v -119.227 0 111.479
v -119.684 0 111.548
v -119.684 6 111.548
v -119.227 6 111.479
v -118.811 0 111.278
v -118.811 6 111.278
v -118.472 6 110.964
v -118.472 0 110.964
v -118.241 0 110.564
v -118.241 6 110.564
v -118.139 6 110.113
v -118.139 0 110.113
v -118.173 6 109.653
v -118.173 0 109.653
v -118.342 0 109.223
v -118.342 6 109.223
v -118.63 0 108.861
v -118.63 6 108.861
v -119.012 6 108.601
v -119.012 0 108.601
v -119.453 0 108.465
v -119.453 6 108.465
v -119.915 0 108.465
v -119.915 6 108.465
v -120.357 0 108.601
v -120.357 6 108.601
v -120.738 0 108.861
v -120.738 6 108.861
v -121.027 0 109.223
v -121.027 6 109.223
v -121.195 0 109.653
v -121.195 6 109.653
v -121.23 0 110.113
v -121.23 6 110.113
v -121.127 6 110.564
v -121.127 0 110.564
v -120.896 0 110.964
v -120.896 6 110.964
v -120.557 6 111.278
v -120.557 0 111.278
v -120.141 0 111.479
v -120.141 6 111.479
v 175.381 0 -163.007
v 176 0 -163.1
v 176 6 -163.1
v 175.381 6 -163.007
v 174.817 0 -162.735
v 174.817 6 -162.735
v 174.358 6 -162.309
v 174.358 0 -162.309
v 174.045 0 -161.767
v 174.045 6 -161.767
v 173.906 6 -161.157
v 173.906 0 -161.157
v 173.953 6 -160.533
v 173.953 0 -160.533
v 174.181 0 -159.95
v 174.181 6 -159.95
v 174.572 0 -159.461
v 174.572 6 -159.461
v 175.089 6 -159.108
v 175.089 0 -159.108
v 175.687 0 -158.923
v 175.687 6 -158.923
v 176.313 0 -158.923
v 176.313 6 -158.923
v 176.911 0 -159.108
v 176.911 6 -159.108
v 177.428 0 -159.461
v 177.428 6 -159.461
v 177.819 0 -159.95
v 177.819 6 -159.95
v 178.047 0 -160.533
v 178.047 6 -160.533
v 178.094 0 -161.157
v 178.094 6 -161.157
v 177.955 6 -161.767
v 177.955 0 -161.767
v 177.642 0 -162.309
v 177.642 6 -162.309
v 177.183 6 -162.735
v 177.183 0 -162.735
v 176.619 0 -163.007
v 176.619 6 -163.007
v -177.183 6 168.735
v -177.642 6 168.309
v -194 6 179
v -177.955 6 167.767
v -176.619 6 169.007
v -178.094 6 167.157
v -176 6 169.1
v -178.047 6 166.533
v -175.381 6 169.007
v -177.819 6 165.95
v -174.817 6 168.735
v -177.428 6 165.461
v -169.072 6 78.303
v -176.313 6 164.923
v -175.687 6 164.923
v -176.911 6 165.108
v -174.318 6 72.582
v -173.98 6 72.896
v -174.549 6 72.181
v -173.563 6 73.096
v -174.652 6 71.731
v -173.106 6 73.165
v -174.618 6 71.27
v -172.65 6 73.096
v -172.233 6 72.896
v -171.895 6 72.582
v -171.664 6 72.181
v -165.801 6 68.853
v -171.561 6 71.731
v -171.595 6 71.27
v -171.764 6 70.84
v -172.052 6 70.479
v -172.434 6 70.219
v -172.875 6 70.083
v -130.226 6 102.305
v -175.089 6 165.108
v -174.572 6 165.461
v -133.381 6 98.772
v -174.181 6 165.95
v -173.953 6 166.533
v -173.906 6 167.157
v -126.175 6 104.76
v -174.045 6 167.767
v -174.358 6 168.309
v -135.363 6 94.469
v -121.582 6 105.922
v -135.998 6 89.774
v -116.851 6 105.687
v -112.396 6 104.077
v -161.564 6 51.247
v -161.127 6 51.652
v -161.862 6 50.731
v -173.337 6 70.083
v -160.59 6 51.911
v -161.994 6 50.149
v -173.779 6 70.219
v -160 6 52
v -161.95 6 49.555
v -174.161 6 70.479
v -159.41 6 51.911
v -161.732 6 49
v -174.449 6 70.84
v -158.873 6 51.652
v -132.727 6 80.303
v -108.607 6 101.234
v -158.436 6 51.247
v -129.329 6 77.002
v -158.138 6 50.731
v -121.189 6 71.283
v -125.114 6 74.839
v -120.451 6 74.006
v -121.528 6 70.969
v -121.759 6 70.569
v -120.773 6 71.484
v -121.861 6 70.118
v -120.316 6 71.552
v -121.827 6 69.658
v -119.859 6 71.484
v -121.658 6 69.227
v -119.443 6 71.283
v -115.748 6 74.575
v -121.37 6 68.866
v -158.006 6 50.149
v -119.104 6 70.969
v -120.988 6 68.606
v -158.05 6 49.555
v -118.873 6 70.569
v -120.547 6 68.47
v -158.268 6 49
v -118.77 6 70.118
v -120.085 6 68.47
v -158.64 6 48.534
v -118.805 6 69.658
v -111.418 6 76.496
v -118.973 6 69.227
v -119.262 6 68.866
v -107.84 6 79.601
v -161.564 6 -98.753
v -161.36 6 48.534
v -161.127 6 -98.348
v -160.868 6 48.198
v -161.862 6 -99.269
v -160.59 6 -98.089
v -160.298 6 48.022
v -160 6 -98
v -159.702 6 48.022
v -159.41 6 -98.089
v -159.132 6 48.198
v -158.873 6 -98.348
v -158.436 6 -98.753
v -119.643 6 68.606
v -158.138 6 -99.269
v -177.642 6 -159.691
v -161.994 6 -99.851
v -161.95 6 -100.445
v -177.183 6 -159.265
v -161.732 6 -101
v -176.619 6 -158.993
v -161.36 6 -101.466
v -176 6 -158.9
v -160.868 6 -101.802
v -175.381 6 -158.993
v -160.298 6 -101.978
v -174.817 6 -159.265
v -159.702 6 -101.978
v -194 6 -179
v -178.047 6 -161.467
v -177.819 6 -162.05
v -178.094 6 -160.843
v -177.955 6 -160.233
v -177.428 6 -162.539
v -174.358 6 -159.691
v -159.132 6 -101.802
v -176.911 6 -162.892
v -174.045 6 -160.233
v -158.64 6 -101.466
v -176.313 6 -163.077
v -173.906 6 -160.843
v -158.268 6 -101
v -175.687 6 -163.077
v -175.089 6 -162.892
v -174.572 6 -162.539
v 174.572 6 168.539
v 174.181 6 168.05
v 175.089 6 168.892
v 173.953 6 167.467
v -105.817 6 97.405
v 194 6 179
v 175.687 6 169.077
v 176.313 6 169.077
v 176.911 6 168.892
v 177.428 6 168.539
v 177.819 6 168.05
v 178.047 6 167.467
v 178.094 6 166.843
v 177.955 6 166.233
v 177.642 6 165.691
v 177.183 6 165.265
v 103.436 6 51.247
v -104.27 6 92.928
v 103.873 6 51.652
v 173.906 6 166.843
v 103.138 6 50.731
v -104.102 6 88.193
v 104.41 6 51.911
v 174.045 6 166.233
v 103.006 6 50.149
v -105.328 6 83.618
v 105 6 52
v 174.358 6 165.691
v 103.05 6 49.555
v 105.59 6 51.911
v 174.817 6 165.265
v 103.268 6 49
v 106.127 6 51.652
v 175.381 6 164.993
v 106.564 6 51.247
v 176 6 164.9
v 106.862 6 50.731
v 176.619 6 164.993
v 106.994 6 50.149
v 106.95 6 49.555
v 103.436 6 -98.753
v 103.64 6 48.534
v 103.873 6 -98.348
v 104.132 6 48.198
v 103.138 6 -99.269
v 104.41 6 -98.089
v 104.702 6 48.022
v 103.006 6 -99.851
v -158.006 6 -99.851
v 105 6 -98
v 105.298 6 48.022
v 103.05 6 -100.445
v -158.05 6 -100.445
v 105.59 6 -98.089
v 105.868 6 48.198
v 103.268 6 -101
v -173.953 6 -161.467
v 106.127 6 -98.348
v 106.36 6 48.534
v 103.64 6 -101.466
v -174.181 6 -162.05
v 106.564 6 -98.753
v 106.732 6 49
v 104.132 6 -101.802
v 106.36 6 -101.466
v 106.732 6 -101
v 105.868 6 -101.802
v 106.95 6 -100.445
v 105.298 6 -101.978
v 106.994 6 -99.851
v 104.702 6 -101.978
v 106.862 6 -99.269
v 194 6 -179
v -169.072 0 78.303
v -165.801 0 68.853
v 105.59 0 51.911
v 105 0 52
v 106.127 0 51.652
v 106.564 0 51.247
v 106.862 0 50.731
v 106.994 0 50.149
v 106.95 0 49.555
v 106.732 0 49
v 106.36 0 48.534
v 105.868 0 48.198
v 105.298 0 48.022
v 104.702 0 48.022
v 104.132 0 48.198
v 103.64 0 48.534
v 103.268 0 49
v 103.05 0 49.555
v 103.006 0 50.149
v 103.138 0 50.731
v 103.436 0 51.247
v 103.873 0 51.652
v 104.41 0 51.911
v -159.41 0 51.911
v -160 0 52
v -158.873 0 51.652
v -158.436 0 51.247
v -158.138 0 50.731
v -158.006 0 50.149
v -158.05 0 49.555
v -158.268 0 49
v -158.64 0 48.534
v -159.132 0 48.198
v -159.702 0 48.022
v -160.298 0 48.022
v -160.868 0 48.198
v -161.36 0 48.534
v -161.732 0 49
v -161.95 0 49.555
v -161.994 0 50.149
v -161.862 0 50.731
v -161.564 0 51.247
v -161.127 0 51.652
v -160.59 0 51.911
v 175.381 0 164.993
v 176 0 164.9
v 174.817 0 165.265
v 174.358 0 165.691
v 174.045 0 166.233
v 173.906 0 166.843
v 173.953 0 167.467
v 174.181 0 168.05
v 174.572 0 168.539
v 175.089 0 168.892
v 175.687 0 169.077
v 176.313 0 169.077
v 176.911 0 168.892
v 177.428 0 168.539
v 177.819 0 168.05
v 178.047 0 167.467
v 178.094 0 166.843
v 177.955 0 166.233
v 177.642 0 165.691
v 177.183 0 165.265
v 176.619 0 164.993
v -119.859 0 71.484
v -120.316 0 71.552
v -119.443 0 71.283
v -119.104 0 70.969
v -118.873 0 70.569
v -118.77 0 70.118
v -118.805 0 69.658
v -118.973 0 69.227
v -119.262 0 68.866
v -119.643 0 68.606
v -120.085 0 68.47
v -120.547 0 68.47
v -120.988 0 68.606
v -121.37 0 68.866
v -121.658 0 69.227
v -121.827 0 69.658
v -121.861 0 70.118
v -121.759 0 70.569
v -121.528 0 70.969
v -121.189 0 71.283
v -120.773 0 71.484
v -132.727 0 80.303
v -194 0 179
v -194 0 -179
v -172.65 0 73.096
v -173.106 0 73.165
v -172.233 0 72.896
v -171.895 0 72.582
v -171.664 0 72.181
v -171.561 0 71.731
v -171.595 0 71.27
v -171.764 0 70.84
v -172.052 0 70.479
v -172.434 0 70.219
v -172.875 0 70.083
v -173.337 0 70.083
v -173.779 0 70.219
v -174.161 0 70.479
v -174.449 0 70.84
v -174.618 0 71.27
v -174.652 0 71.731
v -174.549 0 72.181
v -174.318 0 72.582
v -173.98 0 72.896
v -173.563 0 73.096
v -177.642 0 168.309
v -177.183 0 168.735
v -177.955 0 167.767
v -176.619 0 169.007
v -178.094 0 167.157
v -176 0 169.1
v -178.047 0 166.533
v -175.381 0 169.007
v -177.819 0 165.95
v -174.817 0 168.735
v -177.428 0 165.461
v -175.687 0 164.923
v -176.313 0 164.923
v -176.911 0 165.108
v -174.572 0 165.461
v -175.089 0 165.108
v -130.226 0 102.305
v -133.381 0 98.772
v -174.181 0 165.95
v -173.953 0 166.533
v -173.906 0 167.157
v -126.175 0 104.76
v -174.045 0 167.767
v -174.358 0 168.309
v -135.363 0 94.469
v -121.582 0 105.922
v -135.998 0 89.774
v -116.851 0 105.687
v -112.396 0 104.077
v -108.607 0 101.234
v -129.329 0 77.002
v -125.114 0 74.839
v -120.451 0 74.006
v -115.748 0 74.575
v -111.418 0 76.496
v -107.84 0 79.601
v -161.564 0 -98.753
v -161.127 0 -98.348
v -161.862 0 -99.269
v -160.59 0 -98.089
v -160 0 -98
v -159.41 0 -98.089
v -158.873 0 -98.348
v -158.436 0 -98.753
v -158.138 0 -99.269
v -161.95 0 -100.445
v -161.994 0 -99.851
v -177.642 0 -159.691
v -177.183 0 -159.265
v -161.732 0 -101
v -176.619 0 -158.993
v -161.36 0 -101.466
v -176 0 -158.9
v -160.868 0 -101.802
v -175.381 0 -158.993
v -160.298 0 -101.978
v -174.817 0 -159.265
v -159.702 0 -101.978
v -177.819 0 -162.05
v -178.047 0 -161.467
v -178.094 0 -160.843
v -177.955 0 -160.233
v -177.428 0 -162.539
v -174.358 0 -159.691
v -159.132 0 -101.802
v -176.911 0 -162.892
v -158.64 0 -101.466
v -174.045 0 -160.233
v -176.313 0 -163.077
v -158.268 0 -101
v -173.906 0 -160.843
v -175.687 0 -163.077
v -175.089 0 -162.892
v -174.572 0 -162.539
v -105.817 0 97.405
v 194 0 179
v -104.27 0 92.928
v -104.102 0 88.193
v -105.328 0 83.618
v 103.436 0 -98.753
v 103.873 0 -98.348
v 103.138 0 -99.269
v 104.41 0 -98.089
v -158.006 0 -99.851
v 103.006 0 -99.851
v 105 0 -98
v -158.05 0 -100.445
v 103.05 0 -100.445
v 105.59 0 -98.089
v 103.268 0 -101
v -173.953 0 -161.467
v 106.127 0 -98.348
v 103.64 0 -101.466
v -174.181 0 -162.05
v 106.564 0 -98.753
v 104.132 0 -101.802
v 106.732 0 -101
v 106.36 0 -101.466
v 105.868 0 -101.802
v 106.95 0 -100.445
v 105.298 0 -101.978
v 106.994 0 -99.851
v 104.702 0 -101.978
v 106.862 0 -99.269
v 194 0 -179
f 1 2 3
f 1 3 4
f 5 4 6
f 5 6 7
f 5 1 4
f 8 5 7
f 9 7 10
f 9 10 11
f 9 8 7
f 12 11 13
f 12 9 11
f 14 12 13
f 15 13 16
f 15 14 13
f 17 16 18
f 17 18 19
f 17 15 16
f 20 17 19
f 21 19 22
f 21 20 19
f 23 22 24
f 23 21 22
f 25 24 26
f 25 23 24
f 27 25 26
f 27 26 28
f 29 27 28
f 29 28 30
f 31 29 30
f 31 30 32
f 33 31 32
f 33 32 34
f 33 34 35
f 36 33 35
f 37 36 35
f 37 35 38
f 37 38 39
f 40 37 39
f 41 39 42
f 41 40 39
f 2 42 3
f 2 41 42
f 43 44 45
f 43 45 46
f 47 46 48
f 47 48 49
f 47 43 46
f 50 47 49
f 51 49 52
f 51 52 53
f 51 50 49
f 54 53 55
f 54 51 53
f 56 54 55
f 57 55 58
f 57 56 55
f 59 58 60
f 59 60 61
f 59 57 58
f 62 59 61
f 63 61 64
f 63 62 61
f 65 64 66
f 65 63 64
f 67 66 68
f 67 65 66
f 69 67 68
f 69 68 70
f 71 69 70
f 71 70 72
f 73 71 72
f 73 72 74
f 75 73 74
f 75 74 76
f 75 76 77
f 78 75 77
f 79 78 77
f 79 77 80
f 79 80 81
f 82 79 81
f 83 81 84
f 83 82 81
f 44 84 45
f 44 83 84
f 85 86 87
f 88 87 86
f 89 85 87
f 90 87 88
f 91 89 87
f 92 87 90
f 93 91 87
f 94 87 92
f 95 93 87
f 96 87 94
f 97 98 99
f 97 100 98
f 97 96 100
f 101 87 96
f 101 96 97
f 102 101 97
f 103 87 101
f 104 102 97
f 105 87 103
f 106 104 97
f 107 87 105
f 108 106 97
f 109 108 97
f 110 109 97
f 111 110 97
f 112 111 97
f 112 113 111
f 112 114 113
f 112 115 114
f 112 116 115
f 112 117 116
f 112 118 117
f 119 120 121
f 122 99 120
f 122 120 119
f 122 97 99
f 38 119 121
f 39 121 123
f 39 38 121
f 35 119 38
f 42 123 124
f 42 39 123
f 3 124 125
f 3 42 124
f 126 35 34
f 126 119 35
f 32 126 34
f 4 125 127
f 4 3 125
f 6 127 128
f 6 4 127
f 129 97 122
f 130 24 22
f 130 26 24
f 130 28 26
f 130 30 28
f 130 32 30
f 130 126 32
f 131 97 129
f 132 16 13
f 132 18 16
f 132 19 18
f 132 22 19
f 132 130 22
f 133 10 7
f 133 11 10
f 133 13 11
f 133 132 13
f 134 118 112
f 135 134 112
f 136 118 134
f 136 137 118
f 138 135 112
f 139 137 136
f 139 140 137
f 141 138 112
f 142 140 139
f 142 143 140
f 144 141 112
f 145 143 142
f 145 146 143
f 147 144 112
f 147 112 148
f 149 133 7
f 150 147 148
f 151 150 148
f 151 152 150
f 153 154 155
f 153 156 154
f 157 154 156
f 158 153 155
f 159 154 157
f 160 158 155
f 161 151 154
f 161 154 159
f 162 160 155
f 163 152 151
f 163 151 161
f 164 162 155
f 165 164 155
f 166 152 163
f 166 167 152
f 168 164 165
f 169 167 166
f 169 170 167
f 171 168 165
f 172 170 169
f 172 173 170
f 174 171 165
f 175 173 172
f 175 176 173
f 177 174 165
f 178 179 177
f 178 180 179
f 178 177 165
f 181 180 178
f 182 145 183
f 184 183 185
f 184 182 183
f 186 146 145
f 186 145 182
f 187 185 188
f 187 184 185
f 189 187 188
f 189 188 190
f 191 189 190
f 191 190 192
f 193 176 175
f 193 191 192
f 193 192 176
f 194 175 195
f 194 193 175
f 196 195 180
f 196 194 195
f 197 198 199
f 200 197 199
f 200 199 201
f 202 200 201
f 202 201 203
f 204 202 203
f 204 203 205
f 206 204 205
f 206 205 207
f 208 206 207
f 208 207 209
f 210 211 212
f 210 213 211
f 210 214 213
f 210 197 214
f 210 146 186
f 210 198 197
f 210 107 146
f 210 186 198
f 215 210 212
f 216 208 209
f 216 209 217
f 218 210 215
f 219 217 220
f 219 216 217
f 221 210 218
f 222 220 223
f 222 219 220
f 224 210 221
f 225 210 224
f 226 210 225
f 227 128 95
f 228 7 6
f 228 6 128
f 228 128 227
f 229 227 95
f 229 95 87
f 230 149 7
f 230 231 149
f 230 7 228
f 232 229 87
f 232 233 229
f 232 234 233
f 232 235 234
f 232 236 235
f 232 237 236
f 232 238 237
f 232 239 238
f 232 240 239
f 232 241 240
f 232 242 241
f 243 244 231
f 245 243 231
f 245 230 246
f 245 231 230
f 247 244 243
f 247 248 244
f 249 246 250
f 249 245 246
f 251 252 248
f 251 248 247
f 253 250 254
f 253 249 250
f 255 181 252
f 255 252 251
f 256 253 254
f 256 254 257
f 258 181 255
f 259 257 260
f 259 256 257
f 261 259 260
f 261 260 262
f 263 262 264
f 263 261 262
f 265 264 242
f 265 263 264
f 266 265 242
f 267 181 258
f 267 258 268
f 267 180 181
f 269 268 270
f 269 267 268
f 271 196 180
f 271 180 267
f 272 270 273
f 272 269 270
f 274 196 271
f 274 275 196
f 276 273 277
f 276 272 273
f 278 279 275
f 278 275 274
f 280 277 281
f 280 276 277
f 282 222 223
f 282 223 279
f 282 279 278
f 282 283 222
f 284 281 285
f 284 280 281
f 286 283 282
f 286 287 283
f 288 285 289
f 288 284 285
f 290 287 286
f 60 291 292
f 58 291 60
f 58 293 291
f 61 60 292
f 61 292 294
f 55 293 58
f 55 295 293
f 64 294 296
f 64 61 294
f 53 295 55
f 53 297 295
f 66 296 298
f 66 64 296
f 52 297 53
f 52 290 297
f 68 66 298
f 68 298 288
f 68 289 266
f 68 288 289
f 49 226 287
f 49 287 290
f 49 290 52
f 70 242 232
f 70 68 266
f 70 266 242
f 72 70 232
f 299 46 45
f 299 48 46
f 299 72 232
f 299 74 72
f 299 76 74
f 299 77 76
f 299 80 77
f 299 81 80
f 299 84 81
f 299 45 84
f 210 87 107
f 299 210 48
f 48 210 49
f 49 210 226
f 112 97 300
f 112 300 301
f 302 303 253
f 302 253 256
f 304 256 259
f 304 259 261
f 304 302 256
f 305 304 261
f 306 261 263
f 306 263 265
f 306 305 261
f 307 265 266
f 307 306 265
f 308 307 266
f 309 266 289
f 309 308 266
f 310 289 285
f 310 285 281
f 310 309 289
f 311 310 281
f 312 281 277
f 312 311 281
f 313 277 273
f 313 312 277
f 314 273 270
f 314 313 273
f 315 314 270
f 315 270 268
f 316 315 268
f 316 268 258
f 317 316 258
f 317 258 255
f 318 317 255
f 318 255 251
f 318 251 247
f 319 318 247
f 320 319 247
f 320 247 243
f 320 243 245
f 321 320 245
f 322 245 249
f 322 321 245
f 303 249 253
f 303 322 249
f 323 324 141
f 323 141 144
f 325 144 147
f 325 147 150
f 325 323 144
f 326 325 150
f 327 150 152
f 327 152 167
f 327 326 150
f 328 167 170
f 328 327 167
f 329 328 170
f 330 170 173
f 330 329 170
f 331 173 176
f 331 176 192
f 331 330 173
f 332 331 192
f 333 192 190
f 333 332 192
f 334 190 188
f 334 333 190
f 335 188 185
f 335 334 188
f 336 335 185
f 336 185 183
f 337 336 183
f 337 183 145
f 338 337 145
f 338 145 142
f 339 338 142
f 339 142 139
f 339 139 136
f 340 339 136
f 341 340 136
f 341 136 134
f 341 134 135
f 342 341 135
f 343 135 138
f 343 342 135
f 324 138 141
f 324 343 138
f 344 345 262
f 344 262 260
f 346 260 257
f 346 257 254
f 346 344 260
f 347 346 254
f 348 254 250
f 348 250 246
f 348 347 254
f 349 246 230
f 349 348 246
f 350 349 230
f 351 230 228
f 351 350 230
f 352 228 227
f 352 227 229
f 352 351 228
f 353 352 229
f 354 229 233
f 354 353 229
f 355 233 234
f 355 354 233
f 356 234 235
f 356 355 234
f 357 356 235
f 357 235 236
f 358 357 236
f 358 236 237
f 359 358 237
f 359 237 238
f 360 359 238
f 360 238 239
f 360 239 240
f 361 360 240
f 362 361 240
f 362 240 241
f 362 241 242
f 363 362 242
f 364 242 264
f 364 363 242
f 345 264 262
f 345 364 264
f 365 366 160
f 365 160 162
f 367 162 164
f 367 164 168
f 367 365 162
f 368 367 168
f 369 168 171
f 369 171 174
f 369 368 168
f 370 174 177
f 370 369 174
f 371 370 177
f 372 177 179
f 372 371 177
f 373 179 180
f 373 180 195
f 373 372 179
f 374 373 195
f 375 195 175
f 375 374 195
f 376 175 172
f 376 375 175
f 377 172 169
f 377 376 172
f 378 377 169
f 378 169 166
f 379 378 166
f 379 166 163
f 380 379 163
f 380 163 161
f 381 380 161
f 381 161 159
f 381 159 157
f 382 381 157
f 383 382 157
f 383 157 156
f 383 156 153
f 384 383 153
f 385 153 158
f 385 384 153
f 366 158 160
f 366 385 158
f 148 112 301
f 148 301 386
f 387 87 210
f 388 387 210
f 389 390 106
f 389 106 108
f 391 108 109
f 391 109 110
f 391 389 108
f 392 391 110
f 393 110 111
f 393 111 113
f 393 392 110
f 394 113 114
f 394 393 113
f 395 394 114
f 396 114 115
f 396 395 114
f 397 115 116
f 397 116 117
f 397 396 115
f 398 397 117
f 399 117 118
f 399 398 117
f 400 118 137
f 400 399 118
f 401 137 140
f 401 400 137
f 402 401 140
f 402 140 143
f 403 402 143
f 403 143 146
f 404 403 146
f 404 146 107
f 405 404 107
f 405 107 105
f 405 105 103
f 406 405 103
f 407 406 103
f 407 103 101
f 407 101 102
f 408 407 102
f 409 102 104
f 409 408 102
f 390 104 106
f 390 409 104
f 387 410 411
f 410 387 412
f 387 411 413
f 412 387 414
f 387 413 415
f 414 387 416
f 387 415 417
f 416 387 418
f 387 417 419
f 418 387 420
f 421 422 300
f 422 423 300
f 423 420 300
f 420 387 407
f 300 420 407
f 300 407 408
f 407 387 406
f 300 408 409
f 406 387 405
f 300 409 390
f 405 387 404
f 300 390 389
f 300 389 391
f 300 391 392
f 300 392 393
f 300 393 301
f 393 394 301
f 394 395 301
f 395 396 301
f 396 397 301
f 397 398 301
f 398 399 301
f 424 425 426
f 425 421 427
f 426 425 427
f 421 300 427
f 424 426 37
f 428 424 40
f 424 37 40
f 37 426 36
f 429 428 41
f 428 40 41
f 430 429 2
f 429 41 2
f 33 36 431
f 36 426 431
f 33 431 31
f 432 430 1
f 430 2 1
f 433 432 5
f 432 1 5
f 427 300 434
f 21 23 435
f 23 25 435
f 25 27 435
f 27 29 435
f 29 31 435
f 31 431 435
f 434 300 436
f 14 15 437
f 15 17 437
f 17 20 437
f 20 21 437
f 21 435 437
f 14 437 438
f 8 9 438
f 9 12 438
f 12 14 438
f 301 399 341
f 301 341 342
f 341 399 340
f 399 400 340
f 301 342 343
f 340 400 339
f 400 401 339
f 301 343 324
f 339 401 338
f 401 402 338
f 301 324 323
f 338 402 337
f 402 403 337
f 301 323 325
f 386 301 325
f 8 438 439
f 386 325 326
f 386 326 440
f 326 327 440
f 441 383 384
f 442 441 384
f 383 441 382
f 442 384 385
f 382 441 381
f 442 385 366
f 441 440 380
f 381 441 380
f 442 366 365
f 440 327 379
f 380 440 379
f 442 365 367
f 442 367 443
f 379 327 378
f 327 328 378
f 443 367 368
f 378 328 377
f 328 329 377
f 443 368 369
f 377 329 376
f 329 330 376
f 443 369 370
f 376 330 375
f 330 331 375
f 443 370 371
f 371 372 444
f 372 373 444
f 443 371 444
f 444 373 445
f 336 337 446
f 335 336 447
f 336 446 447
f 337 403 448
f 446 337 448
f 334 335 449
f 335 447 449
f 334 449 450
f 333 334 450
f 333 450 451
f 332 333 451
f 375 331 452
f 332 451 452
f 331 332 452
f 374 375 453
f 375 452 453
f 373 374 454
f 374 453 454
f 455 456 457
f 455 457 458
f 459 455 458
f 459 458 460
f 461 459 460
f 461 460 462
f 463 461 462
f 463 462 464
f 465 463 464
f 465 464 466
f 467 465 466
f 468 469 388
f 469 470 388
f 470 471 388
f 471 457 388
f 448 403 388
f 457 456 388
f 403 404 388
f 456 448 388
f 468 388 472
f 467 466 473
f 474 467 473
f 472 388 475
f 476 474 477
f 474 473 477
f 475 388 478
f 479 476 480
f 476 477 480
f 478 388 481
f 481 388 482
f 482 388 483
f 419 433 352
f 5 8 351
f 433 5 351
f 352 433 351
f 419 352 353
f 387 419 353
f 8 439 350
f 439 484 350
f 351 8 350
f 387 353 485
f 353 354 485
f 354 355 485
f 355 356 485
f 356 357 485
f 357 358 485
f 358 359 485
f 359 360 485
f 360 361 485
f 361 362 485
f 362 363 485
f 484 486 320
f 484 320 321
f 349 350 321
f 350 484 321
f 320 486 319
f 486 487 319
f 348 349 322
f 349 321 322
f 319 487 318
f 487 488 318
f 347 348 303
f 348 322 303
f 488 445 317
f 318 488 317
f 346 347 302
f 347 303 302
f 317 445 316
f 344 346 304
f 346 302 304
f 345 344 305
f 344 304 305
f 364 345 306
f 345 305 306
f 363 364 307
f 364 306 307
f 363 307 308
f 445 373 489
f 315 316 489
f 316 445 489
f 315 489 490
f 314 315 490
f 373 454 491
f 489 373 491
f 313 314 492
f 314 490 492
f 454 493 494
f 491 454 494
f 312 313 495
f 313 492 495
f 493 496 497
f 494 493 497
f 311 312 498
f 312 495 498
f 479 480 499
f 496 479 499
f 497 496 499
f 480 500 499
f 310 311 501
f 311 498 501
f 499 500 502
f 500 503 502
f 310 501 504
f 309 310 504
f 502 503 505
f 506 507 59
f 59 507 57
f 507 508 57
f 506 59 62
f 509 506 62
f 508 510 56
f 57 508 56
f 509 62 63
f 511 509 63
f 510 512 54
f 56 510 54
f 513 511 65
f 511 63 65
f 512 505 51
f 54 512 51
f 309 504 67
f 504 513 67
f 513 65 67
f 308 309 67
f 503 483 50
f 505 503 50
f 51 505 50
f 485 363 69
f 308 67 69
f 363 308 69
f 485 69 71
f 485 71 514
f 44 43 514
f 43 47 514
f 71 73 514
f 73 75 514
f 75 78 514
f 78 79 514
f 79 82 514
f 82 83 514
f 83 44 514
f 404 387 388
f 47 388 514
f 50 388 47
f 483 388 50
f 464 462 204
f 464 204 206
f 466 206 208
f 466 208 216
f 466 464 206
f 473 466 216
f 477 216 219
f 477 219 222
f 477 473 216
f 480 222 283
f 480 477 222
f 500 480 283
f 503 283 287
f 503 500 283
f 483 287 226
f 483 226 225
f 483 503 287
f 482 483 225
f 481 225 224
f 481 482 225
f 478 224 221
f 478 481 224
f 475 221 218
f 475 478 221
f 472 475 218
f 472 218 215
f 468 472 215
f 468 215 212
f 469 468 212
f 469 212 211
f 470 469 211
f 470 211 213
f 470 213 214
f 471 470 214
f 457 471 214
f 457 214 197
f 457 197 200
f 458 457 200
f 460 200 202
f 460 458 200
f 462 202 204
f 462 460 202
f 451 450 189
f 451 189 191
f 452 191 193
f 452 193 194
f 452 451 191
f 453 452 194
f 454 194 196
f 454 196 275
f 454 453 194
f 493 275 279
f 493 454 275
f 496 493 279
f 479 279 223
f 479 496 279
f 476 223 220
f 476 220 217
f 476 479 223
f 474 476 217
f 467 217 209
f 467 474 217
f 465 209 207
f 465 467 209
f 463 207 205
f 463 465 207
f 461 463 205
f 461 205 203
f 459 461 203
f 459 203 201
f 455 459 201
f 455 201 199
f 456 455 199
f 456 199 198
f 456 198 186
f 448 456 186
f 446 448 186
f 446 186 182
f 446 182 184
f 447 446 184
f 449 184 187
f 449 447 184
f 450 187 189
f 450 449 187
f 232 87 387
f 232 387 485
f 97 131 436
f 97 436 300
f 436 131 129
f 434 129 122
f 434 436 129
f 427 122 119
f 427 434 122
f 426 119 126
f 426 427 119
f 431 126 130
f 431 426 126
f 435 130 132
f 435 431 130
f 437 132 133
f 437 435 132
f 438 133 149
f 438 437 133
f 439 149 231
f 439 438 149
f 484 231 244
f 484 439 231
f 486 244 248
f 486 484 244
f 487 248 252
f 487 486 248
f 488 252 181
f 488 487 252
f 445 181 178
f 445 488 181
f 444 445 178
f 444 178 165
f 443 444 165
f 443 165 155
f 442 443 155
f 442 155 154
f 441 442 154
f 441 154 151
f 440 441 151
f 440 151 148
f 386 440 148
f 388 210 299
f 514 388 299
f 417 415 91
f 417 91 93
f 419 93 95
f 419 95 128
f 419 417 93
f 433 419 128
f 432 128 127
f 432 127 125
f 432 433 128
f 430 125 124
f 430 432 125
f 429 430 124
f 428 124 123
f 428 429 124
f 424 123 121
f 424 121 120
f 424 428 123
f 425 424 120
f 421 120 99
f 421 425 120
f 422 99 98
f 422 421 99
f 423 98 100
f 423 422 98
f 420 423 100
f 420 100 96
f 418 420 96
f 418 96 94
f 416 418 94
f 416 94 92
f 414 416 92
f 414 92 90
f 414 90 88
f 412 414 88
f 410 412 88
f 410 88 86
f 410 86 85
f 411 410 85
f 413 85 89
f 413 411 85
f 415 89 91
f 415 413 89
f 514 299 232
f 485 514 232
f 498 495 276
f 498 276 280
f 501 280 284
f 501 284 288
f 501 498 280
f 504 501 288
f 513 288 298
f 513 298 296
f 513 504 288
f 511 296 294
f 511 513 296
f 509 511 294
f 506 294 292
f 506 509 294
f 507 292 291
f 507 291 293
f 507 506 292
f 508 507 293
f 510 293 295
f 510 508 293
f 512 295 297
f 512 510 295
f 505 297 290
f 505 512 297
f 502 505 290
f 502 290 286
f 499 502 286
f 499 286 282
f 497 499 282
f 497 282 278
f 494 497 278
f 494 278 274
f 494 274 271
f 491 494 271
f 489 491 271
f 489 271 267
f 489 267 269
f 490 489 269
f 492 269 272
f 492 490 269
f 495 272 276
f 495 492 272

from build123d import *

# Parameters (mm, degrees)
SKETCH1_W           = 390
SKETCH1_H           = 360
SKETCH1_R           = 2.1
SKETCH1_R_2         = 16
SKETCH1_R_3         = 2
SKETCH1_R_4         = 1.55
BOSS_EXTRUDE1_DEPTH = 6
CUT_EXTRUDE1_REACH  = 267.445
SKETCH5_W           = 390
SKETCH5_H           = 1
CUT_EXTRUDE2_DEPTH  = 266.444909539
CUT_EXTRUDE3_DEPTH  = 266.444909539


with BuildPart() as part:
    # Sketch1 → Boss-Extrude1 (new body)
    with BuildSketch(Plane(origin=(0, 0, 0), x_dir=(1, 0, 0), z_dir=(0, 1, 0))):
        Rectangle(SKETCH1_W, SKETCH1_H)
        with Locations(Location((-176, 161, 0), (0, 0, 270))):
            Circle(SKETCH1_R, mode=Mode.SUBTRACT)
        with Locations(Location((-176, -167, 0), (0, 0, 270))):
            Circle(SKETCH1_R, mode=Mode.SUBTRACT)
        with Locations(Location((-120, -90, 0), (0, 0, 270))):
            Circle(SKETCH1_R_2, mode=Mode.SUBTRACT)
        with Locations(Location((176, -167, 0), (0, 0, 90))):
            Circle(SKETCH1_R, mode=Mode.SUBTRACT)
        with Locations(Location((176, 161, 0), (0, 0, 90))):
            Circle(SKETCH1_R, mode=Mode.SUBTRACT)
        with Locations(Location((-160, -50, 0), (0, 0, 270))):
            Circle(SKETCH1_R_3, mode=Mode.SUBTRACT)
        with Locations(Location((-160, 100, 0), (0, 0, 270))):
            Circle(SKETCH1_R_3, mode=Mode.SUBTRACT)
        with Locations(Location((105, -50, 0), (0, 0, 270))):
            Circle(SKETCH1_R_3, mode=Mode.SUBTRACT)
        with Locations(Location((105, 100, 0), (0, 0, 270))):
            Circle(SKETCH1_R_3, mode=Mode.SUBTRACT)
        with Locations(Location((-119.684190721, -109.997506457, 0), (0, 0, 270))):
            Circle(SKETCH1_R_4, mode=Mode.SUBTRACT)
        with Locations(Location((-120.315809279, -70.002493543, 0), (0, 0, 270))):
            Circle(SKETCH1_R_4, mode=Mode.SUBTRACT)
        with Locations(Location((-173.106414611, -71.615200698, 0), (0, 0, 270))):
            Circle(SKETCH1_R_4, mode=Mode.SUBTRACT)
    extrude(amount=BOSS_EXTRUDE1_DEPTH)

    # Sketch4 → Cut-Extrude1 (cut, up to next)
    with BuildSketch(Plane(origin=(0, 6, 0), x_dir=(1, 0, 0), z_dir=(0, 1, 0)), mode=Mode.PRIVATE) as cut_extrude1_sk1:
        with BuildLine():
            Line((-135.998409614, -89.77441229), (-169.072254333, -78.302916757))
            Line((-169.072254333, -78.302916757), (-165.800861457, -68.853156465))
            Line((-165.800861457, -68.853156465), (-132.726704425, -80.303041999))
            ThreePointArc((-132.726704425, -80.303041999), (-104.876846958, -95.224006323), (-135.998409614, -89.77441229))
        make_face()
    cut_extrude1_tool1 = extrude(cut_extrude1_sk1.sketch, amount=-CUT_EXTRUDE1_REACH, mode=Mode.PRIVATE) & part.part
    add(cut_extrude1_tool1.solids().sort_by_distance((-129.350351, 6, 86.764679))[0], mode=Mode.SUBTRACT)

    # Sketch5 → Cut-Extrude2 (cut, through all)
    with BuildSketch(Plane(origin=(0, 6, 0), x_dir=(1, 0, 0), z_dir=(0, 1, 0))):
        with Locations((0, -179.5)):
            Rectangle(SKETCH5_W, SKETCH5_H)
    extrude(amount=-CUT_EXTRUDE2_DEPTH, mode=Mode.SUBTRACT)

    # Sketch6 → Cut-Extrude3 (cut, through all)
    with BuildSketch(Plane(origin=(0, 6, 0), x_dir=(1, 0, 0), z_dir=(0, 1, 0))):
        Polygon((195, -179), (195, 180), (-195, 180), (-195, -179), (-194, -179), (-194, 179), (194, 179), (194, -179), align=None)
    extrude(amount=-CUT_EXTRUDE3_DEPTH, mode=Mode.SUBTRACT)


solid = part.part
